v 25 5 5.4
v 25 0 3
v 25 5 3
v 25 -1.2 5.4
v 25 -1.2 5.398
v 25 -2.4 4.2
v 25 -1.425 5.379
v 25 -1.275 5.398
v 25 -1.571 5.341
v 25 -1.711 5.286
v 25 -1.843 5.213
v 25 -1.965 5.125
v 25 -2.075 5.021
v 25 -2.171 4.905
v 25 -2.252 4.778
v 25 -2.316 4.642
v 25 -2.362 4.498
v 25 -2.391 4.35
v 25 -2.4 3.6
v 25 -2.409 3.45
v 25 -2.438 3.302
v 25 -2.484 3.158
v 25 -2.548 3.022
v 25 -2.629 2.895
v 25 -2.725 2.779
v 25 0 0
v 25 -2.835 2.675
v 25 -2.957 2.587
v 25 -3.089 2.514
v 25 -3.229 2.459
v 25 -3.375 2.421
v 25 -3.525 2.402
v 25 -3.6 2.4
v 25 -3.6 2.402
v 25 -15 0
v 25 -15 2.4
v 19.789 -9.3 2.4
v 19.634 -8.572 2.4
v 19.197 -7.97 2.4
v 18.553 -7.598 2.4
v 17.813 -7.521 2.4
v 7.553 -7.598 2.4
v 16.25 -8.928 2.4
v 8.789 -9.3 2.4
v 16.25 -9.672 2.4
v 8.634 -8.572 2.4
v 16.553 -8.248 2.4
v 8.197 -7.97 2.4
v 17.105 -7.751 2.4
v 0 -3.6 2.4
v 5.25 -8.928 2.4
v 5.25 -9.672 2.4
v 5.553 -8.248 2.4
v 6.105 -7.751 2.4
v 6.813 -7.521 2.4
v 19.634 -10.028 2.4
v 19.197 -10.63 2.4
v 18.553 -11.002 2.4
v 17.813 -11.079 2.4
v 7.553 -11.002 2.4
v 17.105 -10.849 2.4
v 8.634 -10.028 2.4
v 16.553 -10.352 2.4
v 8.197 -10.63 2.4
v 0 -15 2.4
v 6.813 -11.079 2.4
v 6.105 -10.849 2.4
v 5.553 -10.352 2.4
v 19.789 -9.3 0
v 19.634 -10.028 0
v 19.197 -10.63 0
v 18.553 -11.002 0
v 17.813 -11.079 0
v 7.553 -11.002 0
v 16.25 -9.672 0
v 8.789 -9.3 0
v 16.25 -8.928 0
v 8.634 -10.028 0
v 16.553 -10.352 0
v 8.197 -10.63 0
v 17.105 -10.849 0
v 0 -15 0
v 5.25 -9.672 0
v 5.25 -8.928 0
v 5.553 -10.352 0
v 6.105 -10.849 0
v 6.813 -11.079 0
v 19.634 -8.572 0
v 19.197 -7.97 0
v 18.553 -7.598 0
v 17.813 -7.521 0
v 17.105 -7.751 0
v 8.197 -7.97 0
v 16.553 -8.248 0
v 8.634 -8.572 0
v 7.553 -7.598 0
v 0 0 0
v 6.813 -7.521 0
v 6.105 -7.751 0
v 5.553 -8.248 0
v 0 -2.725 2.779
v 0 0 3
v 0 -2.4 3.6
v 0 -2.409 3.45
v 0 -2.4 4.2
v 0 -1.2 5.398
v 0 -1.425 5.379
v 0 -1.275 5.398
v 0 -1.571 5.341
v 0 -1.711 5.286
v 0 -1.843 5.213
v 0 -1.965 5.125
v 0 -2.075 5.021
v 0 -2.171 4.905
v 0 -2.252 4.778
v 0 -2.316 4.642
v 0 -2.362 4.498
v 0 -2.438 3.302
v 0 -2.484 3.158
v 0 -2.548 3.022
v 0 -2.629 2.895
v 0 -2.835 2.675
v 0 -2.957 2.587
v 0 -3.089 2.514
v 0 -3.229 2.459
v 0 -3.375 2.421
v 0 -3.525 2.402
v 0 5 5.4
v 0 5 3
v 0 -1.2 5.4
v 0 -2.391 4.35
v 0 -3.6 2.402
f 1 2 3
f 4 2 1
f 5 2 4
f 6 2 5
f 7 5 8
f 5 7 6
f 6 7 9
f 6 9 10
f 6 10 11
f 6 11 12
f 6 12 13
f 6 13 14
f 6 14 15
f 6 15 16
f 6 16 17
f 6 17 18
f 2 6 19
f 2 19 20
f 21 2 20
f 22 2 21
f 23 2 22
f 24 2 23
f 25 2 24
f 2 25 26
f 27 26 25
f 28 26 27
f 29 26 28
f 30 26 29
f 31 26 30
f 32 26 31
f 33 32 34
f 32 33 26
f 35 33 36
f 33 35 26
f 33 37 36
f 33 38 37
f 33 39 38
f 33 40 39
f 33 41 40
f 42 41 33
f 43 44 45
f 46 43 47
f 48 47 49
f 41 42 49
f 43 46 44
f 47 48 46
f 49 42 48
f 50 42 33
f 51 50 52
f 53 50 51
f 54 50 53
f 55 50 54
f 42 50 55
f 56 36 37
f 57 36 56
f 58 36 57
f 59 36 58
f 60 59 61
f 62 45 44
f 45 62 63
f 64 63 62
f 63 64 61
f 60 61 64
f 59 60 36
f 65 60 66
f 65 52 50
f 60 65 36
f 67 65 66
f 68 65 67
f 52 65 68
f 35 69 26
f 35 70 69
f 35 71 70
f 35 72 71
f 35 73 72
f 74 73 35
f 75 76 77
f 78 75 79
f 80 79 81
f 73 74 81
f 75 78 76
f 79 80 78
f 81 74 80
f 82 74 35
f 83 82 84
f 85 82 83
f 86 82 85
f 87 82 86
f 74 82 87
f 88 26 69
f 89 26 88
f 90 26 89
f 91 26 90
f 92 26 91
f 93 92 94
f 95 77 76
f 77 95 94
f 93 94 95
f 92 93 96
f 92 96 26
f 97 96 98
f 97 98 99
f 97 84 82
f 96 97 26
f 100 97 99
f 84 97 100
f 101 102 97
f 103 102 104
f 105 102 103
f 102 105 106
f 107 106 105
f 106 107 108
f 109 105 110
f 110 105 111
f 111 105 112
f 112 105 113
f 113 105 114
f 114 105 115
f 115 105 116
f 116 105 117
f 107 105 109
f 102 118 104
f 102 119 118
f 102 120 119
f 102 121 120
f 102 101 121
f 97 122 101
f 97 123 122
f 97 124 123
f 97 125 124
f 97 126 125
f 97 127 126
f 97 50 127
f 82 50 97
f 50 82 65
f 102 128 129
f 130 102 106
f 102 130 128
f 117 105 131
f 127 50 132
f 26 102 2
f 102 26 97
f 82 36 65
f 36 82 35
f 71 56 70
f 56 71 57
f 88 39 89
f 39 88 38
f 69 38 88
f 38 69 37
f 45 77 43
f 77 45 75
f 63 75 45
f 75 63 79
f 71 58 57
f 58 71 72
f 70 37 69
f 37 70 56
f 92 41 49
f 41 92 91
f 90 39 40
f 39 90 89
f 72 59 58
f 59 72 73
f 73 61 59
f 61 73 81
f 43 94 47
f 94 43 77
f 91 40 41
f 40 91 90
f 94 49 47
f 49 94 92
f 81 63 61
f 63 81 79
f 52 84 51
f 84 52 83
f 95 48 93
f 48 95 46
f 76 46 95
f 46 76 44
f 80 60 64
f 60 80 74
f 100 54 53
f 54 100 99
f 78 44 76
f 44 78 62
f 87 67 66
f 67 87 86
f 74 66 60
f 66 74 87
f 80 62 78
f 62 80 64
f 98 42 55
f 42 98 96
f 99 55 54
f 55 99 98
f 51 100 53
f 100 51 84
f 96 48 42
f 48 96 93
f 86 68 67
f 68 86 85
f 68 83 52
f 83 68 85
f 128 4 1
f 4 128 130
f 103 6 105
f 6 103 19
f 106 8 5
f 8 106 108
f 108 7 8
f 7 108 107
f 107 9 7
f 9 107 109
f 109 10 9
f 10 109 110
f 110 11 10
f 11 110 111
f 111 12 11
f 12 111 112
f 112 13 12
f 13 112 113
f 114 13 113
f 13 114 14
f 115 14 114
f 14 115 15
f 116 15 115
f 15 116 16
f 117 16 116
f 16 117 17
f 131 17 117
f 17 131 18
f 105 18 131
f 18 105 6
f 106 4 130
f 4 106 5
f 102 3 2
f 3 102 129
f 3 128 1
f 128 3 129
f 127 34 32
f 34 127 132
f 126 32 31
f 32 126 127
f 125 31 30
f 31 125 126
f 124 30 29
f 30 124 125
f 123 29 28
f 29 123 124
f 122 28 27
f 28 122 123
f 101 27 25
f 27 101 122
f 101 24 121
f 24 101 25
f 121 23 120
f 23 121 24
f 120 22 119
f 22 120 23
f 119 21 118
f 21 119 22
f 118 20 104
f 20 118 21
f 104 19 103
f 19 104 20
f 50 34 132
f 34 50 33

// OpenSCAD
// file: ../lib/hole.scad
module cylinder_outer(h,d=undef,d1=undef,d2=undef,fn=15) {
	fudge = cos(180/fn);
	cylinder(h=h,d=d/fudge,d1=d1/fudge,d2=d2/fudge,$fn=fn);
}

module hole(d, height, countersink=0, extra_above=false) {
	height = height - countersink;
	translate([0, 0, -(height+countersink)]) {
		translate([0, 0, height+0.001]) cylinder_outer(d1=d, d2=d*1.5, h=countersink);
		if (extra_above) {
			translate([0, 0, height+0.001]) cylinder_outer(d1=d, d2=d*2, h=countersink*3/2);
		}
		if (height > 0)
			translate([0, 0, -2]) cylinder_outer(d=d, h=height+2.1);
	}
}

module nut_trap(w, h, sides){
	cylinder(r = w / 2 / cos(180 / 6) + 0.05, h=h, $fn=6);
}

module rim(id, od, h) {
	difference() {
		cylinder_outer(h=h, d=od);
		translate([0, 0, -1]) cylinder(h=h+2, d=id);
	}
}

rim(8.5, 13, 2);
// file: ../lib/bevel.scad
module bevel(l, s, oe=0.1) {
	scale([-1, 1, 1])
	rotate([0, -90, 0])
	linear_extrude(l)
	difference() {
		translate([-oe, -oe]) square([s+oe, s+oe]);
		translate([s, s]) circle(r=s, center=true);
	}
}


module bevel_inv(l, s) {
	scale([-1, 1, 1])
	rotate([0, -90, 0])
	linear_extrude(l)
	difference() {
		square([s, s]);
		difference() {
			square([s, s]);
			translate([s, s]) circle(r=s, center=true);
		}
	}
}
// main file
use <../lib/bevel.scad>;
use <../lib/hole.scad>;

glass_thickness = 3;
length = 25;
width = 20;
thickness = 2.4;
hole = 3.5;
glass_width = 5;
$fn = 50;
other_width = width - glass_width;

translate([0, -other_width, 0]) difference() {
	cube([length, other_width, thickness]);
	translate([length-hole*2, (other_width-thickness*1.5)/2, thickness]) hole(hole, thickness);
	translate([hole*2, (other_width-thickness*1.5)/2, thickness]) hole(hole, thickness);
}
translate([0, -thickness, thickness]) rotate([90, 0, 0]) bevel(length, thickness/2);
difference() {
	translate([0, -thickness, 0]) cube([length, thickness, glass_thickness+thickness]);
	translate([-1, -thickness, thickness+glass_thickness]) rotate([270, 0, 0]) bevel(length+2, thickness/2);
}
translate([0, 0, glass_thickness]) {
	cube([length, glass_width, thickness]);
	translate([0, -thickness, thickness]) rotate([270, 0, 0]) bevel_inv(length, thickness);
}
